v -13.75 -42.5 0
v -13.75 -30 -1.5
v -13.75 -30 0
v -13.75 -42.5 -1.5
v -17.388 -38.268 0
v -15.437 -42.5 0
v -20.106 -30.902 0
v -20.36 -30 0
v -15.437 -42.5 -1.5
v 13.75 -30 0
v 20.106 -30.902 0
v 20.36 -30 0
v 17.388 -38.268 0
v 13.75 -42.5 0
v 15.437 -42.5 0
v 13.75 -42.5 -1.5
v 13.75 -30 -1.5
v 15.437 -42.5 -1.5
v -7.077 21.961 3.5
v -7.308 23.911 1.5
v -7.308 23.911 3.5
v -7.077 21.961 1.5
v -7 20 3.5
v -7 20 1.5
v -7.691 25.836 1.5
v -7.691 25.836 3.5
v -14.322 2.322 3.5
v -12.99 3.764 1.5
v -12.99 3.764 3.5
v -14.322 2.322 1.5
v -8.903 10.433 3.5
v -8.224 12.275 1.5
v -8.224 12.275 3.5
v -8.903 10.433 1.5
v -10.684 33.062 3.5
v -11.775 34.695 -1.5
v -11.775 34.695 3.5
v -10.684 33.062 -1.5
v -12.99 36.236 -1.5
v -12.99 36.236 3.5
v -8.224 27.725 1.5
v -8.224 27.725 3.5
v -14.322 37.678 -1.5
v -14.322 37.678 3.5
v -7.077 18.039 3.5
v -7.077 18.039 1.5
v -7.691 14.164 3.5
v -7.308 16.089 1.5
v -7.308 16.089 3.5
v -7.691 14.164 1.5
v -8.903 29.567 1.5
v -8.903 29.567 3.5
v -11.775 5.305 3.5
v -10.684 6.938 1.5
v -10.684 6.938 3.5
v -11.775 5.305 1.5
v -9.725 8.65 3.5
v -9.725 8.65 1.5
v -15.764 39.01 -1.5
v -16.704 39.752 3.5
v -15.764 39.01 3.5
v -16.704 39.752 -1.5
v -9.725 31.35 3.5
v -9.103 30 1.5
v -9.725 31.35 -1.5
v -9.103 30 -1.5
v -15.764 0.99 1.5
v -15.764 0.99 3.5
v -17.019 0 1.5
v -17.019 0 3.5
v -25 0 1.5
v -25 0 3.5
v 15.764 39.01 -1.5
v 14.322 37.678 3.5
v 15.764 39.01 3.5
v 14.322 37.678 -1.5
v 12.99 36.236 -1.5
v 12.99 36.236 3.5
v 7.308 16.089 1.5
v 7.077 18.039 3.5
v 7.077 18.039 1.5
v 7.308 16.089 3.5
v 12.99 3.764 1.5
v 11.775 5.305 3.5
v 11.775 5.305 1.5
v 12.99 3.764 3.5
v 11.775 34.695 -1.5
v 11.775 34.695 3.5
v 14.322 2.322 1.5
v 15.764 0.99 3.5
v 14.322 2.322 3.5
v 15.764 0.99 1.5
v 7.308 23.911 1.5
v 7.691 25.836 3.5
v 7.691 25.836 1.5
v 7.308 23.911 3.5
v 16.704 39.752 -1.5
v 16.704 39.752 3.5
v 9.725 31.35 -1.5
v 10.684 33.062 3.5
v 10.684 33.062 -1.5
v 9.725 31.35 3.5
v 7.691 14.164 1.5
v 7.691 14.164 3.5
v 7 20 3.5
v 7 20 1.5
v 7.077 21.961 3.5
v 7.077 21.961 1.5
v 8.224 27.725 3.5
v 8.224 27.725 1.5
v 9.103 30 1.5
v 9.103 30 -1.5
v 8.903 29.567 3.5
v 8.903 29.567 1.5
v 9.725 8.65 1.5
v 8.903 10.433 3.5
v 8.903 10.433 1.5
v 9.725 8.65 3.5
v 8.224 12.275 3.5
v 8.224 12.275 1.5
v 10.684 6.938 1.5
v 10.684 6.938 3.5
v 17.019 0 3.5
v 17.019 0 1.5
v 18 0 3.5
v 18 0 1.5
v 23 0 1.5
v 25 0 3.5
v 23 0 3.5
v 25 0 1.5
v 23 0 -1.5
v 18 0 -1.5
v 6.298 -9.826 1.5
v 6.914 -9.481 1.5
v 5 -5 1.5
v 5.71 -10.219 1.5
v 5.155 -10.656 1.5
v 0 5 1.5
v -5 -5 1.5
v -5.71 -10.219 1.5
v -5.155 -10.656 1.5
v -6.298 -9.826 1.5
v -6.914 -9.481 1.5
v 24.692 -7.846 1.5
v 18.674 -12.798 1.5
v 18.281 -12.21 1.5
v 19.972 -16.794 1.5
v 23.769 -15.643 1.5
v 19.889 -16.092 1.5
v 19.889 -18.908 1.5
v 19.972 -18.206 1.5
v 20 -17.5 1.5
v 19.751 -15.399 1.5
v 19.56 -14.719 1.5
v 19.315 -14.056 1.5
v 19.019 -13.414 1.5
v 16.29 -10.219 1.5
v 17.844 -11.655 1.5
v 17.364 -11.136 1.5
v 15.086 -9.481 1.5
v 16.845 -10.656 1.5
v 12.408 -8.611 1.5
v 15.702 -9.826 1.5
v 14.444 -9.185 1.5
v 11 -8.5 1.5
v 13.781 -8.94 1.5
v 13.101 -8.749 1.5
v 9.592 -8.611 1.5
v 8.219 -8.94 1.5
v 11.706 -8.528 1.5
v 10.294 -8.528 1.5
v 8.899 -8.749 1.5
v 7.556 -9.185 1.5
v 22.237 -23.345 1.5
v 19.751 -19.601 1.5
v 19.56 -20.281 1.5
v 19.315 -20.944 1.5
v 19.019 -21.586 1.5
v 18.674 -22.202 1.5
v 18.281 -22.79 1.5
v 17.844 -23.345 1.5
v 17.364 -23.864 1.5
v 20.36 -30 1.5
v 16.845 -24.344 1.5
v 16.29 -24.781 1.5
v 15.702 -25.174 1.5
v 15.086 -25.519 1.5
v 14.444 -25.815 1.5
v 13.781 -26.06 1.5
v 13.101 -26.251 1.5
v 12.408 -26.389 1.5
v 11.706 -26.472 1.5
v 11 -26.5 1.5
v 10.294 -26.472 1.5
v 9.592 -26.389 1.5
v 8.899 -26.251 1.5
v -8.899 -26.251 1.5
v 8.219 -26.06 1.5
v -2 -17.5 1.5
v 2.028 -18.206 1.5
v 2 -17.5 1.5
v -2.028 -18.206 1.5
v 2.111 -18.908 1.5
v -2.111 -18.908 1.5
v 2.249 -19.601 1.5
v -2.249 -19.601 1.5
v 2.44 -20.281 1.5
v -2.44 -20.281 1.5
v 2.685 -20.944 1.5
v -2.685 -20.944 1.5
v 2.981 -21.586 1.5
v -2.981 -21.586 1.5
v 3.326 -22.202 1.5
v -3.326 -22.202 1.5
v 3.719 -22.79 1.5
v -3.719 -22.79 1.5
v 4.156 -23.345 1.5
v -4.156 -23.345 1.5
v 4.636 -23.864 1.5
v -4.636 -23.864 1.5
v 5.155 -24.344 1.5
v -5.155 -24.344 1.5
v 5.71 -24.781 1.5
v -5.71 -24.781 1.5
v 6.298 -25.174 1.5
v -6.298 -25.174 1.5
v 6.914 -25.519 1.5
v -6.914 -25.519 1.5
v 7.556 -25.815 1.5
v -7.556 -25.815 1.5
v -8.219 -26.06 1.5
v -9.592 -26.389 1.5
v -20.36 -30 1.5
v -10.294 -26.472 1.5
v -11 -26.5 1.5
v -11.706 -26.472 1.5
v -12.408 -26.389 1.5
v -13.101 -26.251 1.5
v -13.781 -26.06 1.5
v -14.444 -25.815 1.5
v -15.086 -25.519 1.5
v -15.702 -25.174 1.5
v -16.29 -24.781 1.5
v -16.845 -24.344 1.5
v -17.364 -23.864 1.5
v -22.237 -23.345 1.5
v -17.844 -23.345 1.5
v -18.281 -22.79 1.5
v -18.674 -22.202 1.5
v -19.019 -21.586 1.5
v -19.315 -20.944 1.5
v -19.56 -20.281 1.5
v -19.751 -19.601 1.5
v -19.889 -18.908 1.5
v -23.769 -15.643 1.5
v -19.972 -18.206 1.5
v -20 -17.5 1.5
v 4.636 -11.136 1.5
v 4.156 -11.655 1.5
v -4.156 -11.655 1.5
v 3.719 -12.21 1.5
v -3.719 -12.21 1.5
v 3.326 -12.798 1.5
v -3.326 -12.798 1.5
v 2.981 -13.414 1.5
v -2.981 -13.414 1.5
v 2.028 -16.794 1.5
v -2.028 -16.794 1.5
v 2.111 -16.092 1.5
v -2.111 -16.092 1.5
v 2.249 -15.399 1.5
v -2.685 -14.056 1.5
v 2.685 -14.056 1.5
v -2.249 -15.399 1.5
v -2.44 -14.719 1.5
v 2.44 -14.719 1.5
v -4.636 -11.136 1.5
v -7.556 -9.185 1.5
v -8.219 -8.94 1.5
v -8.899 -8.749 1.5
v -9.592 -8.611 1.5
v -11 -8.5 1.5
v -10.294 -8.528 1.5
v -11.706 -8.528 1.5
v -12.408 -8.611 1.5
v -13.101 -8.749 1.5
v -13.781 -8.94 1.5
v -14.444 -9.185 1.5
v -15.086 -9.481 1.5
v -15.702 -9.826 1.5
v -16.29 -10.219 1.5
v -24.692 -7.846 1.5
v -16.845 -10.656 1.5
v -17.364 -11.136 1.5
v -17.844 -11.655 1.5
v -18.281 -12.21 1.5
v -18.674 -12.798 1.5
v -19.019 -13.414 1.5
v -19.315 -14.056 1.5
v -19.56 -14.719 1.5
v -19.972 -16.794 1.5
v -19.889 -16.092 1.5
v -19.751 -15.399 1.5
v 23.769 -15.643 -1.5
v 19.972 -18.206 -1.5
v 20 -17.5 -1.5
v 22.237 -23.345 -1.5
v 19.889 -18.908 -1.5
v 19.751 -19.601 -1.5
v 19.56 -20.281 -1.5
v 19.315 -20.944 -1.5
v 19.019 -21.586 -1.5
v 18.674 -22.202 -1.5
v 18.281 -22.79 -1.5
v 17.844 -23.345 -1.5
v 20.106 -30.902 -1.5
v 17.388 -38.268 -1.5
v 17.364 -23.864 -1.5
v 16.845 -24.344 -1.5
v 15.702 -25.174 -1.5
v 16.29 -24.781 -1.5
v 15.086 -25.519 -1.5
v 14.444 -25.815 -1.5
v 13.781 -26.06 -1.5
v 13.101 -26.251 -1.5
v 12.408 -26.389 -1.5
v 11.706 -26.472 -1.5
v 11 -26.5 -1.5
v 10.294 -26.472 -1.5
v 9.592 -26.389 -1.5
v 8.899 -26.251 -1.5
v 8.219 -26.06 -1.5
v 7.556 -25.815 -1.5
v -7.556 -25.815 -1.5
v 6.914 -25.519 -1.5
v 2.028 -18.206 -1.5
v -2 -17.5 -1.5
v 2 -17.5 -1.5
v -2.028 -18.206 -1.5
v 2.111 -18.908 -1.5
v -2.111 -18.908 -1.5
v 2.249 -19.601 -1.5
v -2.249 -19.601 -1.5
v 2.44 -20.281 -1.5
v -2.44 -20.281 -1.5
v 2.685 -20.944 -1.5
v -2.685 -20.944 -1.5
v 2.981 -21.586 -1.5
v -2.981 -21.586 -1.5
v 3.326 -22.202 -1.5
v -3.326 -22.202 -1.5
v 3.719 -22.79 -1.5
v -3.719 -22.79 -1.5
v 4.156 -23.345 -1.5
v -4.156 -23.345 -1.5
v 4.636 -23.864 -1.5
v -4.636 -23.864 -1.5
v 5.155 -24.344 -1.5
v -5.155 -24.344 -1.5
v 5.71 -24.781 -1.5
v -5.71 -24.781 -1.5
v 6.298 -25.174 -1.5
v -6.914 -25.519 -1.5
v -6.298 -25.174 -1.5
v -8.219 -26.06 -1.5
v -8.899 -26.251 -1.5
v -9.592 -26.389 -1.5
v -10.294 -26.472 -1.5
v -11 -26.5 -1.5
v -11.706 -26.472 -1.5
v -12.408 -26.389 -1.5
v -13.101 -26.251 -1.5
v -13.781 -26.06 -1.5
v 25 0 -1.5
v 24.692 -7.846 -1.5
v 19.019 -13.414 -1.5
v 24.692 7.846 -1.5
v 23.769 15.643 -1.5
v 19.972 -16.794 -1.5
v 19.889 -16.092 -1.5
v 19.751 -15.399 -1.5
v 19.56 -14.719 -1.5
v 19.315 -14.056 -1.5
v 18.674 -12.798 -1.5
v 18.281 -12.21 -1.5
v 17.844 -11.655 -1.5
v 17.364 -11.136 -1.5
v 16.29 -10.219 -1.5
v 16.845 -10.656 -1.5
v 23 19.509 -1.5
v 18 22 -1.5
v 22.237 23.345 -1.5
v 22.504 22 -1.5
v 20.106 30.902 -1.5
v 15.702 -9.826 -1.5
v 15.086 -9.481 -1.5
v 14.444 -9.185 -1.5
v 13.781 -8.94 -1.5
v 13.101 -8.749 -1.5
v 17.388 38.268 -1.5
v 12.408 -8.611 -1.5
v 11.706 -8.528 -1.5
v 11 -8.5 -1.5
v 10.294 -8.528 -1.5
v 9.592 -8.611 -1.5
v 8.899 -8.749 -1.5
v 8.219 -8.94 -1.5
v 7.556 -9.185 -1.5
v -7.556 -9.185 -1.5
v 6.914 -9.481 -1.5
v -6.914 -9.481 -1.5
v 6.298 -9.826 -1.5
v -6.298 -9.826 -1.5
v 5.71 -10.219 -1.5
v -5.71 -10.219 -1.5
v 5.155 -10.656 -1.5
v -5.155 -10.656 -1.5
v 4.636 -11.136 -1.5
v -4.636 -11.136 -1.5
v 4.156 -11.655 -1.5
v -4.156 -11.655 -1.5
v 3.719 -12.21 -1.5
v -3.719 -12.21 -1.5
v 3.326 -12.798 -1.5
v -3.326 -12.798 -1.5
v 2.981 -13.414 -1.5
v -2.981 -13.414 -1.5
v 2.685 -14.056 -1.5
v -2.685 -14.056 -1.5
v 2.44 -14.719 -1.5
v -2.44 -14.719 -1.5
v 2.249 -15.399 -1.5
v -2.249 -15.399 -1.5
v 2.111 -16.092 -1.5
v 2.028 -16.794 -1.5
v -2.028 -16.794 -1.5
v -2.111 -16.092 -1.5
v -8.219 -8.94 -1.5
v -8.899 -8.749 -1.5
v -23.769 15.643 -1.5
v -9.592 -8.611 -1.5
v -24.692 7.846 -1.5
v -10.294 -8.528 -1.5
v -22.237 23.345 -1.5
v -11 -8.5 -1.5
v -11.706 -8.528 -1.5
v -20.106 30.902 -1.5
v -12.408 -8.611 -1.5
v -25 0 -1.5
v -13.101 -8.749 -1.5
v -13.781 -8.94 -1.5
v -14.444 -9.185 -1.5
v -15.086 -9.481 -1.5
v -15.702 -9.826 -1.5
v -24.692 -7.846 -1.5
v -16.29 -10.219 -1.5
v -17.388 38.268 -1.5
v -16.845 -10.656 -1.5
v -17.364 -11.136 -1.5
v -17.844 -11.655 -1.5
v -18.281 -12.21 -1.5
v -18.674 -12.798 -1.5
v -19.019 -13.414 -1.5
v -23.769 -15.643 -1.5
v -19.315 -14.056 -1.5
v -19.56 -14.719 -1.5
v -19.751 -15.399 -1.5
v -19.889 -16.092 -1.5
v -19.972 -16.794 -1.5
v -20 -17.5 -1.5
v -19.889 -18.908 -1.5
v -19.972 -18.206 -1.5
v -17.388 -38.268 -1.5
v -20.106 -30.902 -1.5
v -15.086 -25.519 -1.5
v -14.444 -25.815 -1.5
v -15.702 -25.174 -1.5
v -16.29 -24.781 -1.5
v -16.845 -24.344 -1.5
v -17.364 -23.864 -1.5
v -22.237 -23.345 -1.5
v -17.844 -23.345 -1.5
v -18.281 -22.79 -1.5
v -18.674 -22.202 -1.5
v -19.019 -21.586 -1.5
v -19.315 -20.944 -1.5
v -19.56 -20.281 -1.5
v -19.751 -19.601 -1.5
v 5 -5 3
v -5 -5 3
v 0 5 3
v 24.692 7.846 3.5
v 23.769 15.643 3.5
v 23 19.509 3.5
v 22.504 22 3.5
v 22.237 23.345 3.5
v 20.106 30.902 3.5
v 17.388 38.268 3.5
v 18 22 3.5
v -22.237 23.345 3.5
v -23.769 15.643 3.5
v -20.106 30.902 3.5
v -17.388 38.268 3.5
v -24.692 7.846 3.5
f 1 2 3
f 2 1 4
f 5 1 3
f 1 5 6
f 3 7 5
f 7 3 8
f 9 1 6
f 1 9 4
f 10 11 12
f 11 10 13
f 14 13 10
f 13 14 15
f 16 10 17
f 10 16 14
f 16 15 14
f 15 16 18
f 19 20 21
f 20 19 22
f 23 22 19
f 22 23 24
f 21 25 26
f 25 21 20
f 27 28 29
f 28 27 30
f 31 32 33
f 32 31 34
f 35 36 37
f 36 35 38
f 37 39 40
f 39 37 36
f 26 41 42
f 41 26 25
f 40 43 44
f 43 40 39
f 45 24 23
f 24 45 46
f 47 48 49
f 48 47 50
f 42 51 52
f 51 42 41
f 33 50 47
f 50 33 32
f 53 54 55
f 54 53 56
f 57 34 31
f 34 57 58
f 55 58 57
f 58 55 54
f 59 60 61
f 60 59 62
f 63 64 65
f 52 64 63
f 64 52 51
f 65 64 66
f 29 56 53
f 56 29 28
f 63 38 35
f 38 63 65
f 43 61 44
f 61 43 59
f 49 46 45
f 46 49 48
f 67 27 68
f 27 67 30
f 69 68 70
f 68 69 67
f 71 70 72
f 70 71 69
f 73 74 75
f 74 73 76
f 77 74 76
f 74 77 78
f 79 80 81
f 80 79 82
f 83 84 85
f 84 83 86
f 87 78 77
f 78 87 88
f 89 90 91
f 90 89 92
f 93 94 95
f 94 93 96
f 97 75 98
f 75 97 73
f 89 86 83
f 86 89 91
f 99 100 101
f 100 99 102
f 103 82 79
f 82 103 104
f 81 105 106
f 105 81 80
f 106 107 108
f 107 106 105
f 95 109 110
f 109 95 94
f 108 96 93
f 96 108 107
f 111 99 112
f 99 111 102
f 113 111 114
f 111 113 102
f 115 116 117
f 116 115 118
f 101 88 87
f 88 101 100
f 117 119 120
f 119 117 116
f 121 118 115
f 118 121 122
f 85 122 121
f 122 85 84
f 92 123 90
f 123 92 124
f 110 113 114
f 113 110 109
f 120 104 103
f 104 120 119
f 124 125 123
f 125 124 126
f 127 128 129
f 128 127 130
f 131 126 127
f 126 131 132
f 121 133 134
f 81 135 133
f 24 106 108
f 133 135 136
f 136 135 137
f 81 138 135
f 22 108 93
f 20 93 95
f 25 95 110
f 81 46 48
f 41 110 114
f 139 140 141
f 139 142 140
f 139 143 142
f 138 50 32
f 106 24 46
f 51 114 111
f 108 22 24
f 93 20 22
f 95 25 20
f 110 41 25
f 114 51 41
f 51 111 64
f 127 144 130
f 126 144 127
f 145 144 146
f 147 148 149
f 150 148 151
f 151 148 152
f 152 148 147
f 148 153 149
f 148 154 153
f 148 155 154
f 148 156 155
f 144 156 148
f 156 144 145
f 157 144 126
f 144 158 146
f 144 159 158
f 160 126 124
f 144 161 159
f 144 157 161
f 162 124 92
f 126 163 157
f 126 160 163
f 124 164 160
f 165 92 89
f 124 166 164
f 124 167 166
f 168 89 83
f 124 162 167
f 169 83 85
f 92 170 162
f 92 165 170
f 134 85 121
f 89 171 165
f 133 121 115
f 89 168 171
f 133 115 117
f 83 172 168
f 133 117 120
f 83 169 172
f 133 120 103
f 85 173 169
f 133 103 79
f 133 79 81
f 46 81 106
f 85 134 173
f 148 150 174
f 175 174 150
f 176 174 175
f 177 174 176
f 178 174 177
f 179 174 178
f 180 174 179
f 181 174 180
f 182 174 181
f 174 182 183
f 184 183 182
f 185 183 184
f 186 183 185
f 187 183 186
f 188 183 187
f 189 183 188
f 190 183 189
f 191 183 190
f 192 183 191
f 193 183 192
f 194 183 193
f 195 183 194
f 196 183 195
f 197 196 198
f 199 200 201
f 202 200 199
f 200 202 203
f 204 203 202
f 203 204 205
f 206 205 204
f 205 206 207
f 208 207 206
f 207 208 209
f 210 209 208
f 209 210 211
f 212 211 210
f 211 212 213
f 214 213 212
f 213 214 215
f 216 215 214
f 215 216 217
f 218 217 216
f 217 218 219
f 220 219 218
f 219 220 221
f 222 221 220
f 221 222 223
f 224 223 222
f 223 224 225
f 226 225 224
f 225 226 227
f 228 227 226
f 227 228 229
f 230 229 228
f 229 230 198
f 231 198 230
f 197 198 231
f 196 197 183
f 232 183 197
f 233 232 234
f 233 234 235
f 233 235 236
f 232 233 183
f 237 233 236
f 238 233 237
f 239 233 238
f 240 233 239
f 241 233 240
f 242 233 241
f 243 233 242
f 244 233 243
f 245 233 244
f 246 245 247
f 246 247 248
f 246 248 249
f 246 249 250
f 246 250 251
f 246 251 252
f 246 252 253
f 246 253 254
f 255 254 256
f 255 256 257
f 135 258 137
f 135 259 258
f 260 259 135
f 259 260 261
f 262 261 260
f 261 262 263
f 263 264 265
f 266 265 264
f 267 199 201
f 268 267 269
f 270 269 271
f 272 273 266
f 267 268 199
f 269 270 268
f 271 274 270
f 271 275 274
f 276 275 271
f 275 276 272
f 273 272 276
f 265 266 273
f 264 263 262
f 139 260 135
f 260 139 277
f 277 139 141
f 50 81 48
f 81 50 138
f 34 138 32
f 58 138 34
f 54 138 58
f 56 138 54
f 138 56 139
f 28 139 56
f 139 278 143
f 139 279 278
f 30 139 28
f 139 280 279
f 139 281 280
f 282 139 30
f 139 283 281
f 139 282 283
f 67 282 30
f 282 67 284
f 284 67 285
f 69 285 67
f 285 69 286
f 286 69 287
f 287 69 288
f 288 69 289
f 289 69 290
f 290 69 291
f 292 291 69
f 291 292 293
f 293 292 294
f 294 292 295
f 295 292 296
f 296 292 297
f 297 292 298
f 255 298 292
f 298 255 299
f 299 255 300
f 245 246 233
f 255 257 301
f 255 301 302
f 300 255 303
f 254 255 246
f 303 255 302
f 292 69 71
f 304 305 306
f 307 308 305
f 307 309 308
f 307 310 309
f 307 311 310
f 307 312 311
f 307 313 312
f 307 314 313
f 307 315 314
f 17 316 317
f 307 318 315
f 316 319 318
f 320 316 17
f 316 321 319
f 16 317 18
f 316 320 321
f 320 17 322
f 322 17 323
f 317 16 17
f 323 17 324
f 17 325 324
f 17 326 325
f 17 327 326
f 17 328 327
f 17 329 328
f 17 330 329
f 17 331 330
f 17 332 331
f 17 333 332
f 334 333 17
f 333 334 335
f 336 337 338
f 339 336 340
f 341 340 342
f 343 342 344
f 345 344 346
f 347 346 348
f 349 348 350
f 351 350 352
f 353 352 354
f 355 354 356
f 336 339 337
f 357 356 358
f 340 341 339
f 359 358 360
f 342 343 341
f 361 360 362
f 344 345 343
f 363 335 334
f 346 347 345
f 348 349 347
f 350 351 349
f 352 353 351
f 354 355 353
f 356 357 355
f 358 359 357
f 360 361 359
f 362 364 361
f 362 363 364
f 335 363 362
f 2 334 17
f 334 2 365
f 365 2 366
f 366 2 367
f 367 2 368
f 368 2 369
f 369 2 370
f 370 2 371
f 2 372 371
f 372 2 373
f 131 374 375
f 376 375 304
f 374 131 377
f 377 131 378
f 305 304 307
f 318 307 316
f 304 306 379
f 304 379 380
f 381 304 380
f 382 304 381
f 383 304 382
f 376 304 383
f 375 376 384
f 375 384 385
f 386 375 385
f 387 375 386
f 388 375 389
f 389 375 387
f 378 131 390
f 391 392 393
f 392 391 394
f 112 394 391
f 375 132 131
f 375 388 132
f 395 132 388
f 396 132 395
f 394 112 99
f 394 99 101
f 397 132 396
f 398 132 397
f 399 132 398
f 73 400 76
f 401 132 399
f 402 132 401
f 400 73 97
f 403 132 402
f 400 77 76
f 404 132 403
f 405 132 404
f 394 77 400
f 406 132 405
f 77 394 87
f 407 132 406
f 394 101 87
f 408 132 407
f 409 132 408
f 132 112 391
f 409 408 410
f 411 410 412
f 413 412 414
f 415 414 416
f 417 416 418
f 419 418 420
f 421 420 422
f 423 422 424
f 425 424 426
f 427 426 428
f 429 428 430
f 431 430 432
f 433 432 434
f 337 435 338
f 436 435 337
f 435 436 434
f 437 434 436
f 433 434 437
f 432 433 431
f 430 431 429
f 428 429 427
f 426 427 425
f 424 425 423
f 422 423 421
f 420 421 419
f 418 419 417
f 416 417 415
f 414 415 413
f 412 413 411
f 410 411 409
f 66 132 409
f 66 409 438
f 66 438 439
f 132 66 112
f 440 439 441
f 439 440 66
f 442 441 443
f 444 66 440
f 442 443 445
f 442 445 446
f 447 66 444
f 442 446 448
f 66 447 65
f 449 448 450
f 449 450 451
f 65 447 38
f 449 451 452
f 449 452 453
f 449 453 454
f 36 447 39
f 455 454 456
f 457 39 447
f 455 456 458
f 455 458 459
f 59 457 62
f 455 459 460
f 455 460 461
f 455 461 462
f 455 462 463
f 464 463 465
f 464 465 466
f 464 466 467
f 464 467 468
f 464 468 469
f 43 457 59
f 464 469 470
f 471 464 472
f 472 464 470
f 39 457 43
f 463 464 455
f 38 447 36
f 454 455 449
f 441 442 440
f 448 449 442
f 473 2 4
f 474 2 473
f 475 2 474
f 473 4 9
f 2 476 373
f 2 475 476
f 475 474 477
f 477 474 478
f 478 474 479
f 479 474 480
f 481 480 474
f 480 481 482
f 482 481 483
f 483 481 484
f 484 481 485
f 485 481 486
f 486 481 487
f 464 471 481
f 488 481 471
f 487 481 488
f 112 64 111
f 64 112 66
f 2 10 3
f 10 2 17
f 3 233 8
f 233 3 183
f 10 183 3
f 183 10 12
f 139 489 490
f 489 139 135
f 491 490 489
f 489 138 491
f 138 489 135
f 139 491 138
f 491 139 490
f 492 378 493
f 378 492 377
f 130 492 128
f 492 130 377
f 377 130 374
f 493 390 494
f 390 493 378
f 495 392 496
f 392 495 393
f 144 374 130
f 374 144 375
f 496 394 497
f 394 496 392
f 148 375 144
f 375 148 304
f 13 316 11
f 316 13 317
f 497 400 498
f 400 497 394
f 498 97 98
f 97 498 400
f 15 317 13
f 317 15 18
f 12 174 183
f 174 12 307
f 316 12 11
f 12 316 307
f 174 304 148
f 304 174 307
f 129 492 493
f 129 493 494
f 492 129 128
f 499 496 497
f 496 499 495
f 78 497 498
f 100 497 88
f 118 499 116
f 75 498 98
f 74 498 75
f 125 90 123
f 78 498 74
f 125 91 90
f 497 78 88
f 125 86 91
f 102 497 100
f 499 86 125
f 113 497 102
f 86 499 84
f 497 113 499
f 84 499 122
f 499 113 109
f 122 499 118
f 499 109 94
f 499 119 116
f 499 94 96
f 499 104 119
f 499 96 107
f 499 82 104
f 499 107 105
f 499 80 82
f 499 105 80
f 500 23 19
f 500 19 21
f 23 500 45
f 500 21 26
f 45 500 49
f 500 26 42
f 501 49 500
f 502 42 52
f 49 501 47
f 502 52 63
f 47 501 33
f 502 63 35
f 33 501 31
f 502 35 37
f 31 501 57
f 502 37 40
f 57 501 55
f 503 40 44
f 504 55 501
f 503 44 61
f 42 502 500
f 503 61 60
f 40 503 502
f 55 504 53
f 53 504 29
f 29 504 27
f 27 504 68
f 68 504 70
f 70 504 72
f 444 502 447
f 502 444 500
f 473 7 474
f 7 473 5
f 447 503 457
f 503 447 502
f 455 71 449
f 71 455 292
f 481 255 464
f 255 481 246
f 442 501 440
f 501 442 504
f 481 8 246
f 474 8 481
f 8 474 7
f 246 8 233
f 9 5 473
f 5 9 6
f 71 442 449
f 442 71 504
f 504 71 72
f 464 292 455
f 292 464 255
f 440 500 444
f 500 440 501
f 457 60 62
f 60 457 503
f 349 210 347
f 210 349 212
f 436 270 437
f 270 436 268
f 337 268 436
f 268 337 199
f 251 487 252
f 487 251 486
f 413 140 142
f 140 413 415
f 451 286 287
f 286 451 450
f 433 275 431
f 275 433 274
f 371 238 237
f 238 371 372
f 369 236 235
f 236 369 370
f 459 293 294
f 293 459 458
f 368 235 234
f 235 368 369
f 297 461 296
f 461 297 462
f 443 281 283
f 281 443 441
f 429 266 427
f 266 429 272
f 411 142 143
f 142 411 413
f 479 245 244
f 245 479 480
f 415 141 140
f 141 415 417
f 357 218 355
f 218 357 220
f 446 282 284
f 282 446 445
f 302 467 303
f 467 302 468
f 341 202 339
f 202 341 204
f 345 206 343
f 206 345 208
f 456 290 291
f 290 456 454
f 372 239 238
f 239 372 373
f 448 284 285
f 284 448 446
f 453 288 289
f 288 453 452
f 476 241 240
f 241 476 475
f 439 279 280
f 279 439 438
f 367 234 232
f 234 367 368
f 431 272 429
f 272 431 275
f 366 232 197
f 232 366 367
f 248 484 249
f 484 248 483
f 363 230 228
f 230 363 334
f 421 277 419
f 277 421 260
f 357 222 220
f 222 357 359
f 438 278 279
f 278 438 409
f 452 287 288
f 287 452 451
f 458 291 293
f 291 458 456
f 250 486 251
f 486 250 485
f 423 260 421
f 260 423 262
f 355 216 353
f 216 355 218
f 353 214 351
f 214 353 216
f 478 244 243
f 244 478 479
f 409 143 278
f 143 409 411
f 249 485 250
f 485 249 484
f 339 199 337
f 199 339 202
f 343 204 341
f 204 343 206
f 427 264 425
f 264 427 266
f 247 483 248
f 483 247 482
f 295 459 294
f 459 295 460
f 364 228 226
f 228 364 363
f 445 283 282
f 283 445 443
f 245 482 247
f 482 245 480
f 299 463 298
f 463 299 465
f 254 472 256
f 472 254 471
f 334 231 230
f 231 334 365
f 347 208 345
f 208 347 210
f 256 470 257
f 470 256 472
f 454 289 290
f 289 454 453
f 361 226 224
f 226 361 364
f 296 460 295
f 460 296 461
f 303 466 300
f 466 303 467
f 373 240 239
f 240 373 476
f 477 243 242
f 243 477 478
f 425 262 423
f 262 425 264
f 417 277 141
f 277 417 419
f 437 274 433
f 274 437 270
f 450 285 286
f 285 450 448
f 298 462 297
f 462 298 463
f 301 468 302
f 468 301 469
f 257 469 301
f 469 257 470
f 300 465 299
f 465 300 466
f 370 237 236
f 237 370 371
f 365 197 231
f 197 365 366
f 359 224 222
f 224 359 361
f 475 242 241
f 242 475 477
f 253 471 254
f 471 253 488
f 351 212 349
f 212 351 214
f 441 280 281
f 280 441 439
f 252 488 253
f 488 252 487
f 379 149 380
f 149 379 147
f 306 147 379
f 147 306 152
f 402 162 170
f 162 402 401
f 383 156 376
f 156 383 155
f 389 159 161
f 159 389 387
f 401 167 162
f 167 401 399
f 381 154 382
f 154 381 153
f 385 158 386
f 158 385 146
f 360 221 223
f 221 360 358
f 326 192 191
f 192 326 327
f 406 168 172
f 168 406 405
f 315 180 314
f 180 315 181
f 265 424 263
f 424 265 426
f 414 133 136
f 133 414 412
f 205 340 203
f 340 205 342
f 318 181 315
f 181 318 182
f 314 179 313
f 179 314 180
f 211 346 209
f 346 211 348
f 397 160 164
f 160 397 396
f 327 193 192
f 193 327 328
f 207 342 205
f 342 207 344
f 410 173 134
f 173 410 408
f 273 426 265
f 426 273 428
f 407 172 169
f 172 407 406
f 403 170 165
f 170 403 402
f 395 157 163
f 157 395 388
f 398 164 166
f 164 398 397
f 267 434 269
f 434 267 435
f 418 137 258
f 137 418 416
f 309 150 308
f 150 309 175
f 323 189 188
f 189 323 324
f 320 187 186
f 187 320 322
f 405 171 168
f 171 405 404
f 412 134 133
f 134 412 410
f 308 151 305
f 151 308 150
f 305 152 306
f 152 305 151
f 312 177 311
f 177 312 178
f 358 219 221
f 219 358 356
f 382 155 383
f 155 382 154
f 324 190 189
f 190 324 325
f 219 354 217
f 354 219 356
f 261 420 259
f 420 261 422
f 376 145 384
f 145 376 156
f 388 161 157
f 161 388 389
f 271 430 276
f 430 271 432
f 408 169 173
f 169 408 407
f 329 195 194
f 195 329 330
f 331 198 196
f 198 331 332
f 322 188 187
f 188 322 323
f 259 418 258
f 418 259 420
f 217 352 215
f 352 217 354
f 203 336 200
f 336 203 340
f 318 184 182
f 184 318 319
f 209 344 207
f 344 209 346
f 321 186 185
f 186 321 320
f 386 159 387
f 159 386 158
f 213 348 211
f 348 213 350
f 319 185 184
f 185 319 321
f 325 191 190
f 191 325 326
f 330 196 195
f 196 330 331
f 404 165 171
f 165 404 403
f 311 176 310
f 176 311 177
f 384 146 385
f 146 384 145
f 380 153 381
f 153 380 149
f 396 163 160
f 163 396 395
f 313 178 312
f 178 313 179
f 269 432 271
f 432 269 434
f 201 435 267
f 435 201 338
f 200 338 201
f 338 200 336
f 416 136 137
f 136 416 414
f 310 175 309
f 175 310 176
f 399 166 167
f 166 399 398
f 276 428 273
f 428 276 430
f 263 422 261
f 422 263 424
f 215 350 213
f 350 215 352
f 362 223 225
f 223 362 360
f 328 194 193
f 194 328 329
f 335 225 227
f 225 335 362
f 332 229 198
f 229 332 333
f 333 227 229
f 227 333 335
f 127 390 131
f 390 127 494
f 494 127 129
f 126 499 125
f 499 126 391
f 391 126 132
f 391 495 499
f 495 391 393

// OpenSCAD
// eye radius if size_factor = 1
eye_r = 9;  // [0:20]
eye_distance = 2*eye_r+4;
// move wing position up or down
wing_offset = 5;   //[-10:10]
// width for the plug hole in the wing if size_factor = 1
plug_width = 5;   //[0:20]
// height for the plug hole in the wing if size_factor = 1
plug_height = 22; //[0:50]
// horizontal offset position for the plug hole in the wing
plug_offset = 13;  //[0:20]
// size factor of the owl, if 1 body owl is 100mm x 60 mm
size_factor = 1;
// thickness (height) of the owl, if 1 ears are 2 mm, body 3mm
height_size_factor = 1.;

difference() {
     union () {
          // ears & body
          intersection() {
               union() {
                    // corpus limits
                    cube(size=[100*size_factor, 60*size_factor, 3*height_size_factor], center=true);
                    // blocks forming ears
                    for ( a=[-1,1] ) {
                         translate([a*17.5*size_factor,-35*size_factor,-1*height_size_factor])
                              cube(size=[7.5*size_factor,15*size_factor,2*height_size_factor], center=true);
                    }
                    // nose
                    linear_extrude(height=6*height_size_factor,center=true)
                         polygon(points=[[-5*size_factor,-5*size_factor],[5*size_factor,-5*size_factor],[0*size_factor,5*size_factor]],
                                 paths=[[0,1,2]]
                              );
                    // wings
                    translate([0,wing_offset,0])
                    for ( a=[-1,1] ) {
                         intersection () {
                              translate([a*32*size_factor,15*size_factor,0])
                                   cylinder(h=15*height_size_factor, r=25*size_factor, center=true, $fn=80);
                              translate([0,17.5*size_factor,0])
                                   cube(size=[100*size_factor,45*size_factor,7.5*height_size_factor], center=true);
                         }
                    }
               }

               // rounded sides
               translate([0,0,1*height_size_factor])
                    intersection_for ( a=[-1,1] ) {
                    translate([a*75*size_factor,0,0])
                         cylinder(h=5*height_size_factor, r=100*size_factor, center=true, $fn=80);
                    }
          }
          // feet
          * for ( a=[-1,1] ) {
               translate([a*12.5*size_factor, (27.5)*size_factor, 0])
                    cylinder(h=3*height_size_factor, r=8*size_factor, center=true, $fn=80);
          }
     }
     // eyes
     for ( a=[-1,1] ) {
          translate([a*(eye_distance/2)*size_factor,-17.5*size_factor,0])
               cylinder(h=10*height_size_factor, r=eye_r*size_factor, center=true, $fn=80);
     }
     // slot for plug
     translate([(plug_offset+plug_width)*size_factor,0,-12.5*height_size_factor])
          cube(size=[plug_width*size_factor,plug_height*size_factor,25*height_size_factor]);
}
